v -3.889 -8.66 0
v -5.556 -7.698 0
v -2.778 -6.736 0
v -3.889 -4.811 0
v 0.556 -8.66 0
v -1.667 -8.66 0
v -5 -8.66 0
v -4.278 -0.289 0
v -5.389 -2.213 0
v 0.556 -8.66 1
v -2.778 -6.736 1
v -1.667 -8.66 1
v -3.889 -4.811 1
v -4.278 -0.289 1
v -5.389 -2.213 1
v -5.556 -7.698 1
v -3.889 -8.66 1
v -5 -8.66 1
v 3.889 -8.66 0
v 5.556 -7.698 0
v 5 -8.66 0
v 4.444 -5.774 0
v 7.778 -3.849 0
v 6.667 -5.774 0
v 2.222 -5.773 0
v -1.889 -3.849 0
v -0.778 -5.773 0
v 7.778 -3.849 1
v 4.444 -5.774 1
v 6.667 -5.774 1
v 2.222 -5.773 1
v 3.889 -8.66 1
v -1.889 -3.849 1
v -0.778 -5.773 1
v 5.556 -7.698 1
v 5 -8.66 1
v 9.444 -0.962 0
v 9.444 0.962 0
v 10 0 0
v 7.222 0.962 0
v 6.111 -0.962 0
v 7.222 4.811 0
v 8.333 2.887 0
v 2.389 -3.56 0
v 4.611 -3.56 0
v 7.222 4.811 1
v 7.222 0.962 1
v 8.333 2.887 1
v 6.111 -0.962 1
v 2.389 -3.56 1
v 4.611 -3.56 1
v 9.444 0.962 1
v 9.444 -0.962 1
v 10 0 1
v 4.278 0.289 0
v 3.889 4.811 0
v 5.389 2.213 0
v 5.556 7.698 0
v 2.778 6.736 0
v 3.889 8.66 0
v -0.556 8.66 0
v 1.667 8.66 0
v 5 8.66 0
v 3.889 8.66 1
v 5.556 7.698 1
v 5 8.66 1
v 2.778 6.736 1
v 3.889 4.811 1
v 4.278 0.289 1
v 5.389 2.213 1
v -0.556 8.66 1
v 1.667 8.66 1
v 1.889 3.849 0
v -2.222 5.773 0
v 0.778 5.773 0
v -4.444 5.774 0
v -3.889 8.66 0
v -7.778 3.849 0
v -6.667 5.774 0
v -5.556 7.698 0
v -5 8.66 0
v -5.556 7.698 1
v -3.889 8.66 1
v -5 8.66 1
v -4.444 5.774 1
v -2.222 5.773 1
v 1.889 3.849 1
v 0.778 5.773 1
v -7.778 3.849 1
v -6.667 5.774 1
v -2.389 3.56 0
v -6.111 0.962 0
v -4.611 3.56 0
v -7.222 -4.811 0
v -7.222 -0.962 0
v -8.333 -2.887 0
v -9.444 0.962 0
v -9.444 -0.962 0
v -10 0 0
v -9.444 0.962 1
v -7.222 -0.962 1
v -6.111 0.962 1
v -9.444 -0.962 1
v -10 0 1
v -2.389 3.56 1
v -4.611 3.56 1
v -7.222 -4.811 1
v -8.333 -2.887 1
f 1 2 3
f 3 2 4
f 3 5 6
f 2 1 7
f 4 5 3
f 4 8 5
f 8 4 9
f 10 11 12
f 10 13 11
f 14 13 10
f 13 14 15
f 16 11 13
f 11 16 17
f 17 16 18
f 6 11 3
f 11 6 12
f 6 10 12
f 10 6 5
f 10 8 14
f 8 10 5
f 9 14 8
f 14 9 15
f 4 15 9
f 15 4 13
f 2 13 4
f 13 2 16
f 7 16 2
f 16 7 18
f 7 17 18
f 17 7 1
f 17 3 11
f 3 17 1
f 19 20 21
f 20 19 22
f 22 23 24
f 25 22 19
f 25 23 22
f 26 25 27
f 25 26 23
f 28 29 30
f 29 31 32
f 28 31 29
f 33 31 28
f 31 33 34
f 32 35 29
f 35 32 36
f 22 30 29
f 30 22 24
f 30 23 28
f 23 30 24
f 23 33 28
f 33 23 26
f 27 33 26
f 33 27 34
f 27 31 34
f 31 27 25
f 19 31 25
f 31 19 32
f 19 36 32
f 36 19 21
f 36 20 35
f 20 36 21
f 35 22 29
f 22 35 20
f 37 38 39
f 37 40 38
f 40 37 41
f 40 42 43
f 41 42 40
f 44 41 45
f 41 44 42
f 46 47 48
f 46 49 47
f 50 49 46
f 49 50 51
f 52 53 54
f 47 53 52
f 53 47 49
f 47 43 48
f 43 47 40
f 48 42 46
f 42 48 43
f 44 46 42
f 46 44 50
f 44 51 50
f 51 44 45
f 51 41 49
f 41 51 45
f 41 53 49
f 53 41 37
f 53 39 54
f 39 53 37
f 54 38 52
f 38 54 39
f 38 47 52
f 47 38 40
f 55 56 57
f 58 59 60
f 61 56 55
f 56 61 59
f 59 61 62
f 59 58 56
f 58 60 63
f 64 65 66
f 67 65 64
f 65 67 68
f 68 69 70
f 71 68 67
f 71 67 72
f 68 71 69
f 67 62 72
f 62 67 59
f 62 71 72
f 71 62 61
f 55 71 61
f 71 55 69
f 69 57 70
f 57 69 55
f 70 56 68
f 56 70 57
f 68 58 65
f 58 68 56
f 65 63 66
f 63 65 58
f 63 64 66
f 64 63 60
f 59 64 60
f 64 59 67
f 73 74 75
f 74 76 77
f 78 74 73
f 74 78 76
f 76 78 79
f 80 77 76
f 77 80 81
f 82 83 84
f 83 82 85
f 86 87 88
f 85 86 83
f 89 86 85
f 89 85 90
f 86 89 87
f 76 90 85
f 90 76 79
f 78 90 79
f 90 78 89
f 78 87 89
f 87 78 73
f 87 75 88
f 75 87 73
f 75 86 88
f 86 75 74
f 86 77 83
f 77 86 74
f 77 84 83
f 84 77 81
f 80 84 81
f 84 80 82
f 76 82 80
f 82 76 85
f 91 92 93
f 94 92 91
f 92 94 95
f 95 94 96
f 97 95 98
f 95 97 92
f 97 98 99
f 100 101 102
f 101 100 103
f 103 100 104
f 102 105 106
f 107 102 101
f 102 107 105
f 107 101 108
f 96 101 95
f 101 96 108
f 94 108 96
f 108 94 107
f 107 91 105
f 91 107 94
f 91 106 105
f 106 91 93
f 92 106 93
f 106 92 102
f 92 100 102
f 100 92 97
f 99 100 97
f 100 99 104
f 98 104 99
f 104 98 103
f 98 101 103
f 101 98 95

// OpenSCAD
// file: parametric-flake.scad
unit = [1, 0];
origin = [0, 0];


/*
    Returns a 2D rotation matrix given an angle.
*/
function rot2d(angle) = [
    [+cos(angle), -sin(angle)],
    [+sin(angle), +cos(angle)]
];


/*
    Calculates the points for a hexagon.
    Used to reference off of for creating the lambda.
    Points are created starting from the right and moving counter-clockwise.

         2   1

      3         0

         4   5
*/
function inner_hex_points(data) = [
    for (angle = [0 : 60 : 300]) 
    dict_get(data, "scale") * rot2d(angle) * unit
];



/*
    Calculates the points for making a lambda.

    Returns two a list of two lists.
    The first list contains the offset for making a flake.
    The second list is used to form the lambda polygon.
*/
function lambda_points(data) =
let (
    hex_points = inner_hex_points(data),
    thickness = dict_get(data, "thickness") / 2,
    top_left = hex_points[2],
    bottom_left = hex_points[4],
    bottom_right = hex_points[5],
    v_0 = thickness * unit,
    v_p60 = thickness * rot2d(60) * unit,
    v_n60 = thickness * rot2d(-60) * unit,
    v_n90 = thickness * rot2d(-90) * unit,
    gap = dict_get(data, "gap") * rot2d(-60) * unit
)
[
    [
        top_left + v_p60,
    ],
    [
        top_left - v_p60 + gap,
        top_left + v_p60 + gap,
        bottom_right + v_0,
        bottom_right - v_0,
        sqrt(3) * v_n90,
        bottom_left + v_0,
        bottom_left,
        bottom_left - v_n60,
        -v_0
    ]
];


/*
    Generates a single lambda at the origin.
*/
module lambda(data) {
    new_data = update_params(data);
    linear_extrude(dict_get(new_data, "height"))
    polygon(lambda_points(new_data)[1]);
}


/*
    Generates a NixOS flake.
*/
module flake(data) {
    new_data = update_params(data);
    colors = dict_get(data, "colors");
    echo(colors);
    for (idx = [0 : 5]) {
        color(colors[idx % len(colors)])
        rotate([0, 0, idx * 60]) 
        translate(-lambda_points(new_data)[0][0])
        translate([-dict_get(new_data, "scale"), 0, 0])
        linear_extrude(dict_get(new_data, "height"))
        polygon(lambda_points(new_data)[1]);
    }
}


/*
    Returns the value from a associative array/dictionary type structure given some key.

    Values can be of any type.
    The dictionary must of be of the form:
    [
        [ "key0", <value0> ],
        [ "key1", <value1> ],
        ...
    ]
*/
function dict_get(dict, key) =
  dict[search([key], dict)[0]][1];


/*
    Updates the user parameters so the flake is unit size when `scale = 1`.
*/
function update_params(data) = let
    // factor was empirically found. It gives a flake that is circumscribed by the unit circle.
    (factor = 2.25) [
    [ "gap", 0.75 * dict_get(data, "scale") * dict_get(data, "gap") / factor ],
    [ "height", dict_get(data, "height") ],
    [ "scale", dict_get(data, "scale") / factor ],
    [ "thickness", dict_get(data, "scale") * dict_get(data, "thickness") / factor ],
];


/*
    The parameters for generating a NixOS flake.

    `gap` - The gap between lambdas.
    `height` - The z-height of the flake.
    `scale` - The radial (x,y) size of the flake.
    `thickness` - The thickness of the lambda legs.

    `scale` updates `gap` and `thickness` so there is no need to compesate these values.
    A `gap` of 0 will leave no gap between the lambdas.
    A `gap` of 1 will remove the top portion of the long lambda leg until the point where the two lambda legs intersect.

    A `gap` of 0.05 to 0.15 is a good value for replicating the official NixOS flake.
    A `thickness` of 0.5 is a good value for replicating the official NixOS flake.
    OpenSCAD doesn't have a concept of units so use `scale` and `height` values in the desired ratio.
*/
params = [
    [ "gap", 0.1 ],
    [ "height", 1 ],
    [ "scale", 10 ],
    [ "thickness", 0.5 ],
    [ "colors", ["#5277C3", "#7EBAE4"]],
];


flake(params);
// main file
use <parametric-flake.scad>

params = [
    [ "gap", 0.1 ],
    [ "height", 1 ],
    [ "scale", 10 ],
    [ "thickness", 0.5 ],
    [ "colors", ["#5277C3", "#7EBAE4"]],
];

flake(params);
